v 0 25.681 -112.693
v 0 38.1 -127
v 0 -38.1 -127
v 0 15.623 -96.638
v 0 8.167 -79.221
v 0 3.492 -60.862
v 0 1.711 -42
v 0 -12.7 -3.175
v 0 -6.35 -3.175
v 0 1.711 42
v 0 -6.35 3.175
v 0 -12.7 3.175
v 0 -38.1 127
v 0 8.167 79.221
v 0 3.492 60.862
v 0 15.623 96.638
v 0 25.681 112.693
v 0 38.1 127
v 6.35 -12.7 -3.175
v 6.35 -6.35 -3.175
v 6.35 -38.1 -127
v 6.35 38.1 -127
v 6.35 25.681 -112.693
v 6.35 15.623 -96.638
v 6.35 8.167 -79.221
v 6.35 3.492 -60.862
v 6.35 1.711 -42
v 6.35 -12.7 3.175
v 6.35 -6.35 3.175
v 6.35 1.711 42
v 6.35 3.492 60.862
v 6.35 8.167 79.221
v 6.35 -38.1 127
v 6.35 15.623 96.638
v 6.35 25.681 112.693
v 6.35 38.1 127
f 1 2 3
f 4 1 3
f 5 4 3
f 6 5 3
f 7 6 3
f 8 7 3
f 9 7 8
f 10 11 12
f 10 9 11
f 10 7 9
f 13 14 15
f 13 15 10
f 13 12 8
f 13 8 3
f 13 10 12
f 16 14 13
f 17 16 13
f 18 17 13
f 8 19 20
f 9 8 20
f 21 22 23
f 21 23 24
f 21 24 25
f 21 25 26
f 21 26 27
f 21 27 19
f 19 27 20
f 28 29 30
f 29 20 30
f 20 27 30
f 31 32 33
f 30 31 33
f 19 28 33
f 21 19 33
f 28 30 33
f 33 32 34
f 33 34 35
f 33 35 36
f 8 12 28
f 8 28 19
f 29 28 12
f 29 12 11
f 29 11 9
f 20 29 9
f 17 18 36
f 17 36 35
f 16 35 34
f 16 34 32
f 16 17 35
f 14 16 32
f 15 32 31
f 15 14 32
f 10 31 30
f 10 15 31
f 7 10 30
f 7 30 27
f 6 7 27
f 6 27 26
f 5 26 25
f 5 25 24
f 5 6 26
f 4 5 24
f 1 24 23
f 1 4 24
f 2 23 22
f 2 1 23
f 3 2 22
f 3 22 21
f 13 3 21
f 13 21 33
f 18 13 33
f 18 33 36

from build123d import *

# Parameters (mm, degrees)
SKETCH1_W           = 6.35
SKETCH1_H           = 6.35
BOSS_EXTRUDE1_DEPTH = 6.35


with BuildPart() as part:
    # Sketch1 → Boss-Extrude1 (new body)
    with BuildSketch(Plane(origin=(0, 0, 0), x_dir=(0, 0, -1), z_dir=(1, 0, 0))):
        with BuildLine():
            Line((-42, 1.711410462), (42, 1.711410462))
            ThreePointArc((42, 1.711410462), (88.07418015, 11.556788259), (127, 38.1))
            Line((127, 38.1), (127, -38.1))
            Line((127, -38.1), (-127, -38.1))
            Line((-127, -38.1), (-127, 38.1))
            ThreePointArc((-127, 38.1), (-88.07418015, 11.556788259), (-42, 1.711410462))
        make_face()
        with Locations((0, -9.525)):
            Rectangle(SKETCH1_W, SKETCH1_H, mode=Mode.SUBTRACT)
    extrude(amount=BOSS_EXTRUDE1_DEPTH)


solid = part.part
